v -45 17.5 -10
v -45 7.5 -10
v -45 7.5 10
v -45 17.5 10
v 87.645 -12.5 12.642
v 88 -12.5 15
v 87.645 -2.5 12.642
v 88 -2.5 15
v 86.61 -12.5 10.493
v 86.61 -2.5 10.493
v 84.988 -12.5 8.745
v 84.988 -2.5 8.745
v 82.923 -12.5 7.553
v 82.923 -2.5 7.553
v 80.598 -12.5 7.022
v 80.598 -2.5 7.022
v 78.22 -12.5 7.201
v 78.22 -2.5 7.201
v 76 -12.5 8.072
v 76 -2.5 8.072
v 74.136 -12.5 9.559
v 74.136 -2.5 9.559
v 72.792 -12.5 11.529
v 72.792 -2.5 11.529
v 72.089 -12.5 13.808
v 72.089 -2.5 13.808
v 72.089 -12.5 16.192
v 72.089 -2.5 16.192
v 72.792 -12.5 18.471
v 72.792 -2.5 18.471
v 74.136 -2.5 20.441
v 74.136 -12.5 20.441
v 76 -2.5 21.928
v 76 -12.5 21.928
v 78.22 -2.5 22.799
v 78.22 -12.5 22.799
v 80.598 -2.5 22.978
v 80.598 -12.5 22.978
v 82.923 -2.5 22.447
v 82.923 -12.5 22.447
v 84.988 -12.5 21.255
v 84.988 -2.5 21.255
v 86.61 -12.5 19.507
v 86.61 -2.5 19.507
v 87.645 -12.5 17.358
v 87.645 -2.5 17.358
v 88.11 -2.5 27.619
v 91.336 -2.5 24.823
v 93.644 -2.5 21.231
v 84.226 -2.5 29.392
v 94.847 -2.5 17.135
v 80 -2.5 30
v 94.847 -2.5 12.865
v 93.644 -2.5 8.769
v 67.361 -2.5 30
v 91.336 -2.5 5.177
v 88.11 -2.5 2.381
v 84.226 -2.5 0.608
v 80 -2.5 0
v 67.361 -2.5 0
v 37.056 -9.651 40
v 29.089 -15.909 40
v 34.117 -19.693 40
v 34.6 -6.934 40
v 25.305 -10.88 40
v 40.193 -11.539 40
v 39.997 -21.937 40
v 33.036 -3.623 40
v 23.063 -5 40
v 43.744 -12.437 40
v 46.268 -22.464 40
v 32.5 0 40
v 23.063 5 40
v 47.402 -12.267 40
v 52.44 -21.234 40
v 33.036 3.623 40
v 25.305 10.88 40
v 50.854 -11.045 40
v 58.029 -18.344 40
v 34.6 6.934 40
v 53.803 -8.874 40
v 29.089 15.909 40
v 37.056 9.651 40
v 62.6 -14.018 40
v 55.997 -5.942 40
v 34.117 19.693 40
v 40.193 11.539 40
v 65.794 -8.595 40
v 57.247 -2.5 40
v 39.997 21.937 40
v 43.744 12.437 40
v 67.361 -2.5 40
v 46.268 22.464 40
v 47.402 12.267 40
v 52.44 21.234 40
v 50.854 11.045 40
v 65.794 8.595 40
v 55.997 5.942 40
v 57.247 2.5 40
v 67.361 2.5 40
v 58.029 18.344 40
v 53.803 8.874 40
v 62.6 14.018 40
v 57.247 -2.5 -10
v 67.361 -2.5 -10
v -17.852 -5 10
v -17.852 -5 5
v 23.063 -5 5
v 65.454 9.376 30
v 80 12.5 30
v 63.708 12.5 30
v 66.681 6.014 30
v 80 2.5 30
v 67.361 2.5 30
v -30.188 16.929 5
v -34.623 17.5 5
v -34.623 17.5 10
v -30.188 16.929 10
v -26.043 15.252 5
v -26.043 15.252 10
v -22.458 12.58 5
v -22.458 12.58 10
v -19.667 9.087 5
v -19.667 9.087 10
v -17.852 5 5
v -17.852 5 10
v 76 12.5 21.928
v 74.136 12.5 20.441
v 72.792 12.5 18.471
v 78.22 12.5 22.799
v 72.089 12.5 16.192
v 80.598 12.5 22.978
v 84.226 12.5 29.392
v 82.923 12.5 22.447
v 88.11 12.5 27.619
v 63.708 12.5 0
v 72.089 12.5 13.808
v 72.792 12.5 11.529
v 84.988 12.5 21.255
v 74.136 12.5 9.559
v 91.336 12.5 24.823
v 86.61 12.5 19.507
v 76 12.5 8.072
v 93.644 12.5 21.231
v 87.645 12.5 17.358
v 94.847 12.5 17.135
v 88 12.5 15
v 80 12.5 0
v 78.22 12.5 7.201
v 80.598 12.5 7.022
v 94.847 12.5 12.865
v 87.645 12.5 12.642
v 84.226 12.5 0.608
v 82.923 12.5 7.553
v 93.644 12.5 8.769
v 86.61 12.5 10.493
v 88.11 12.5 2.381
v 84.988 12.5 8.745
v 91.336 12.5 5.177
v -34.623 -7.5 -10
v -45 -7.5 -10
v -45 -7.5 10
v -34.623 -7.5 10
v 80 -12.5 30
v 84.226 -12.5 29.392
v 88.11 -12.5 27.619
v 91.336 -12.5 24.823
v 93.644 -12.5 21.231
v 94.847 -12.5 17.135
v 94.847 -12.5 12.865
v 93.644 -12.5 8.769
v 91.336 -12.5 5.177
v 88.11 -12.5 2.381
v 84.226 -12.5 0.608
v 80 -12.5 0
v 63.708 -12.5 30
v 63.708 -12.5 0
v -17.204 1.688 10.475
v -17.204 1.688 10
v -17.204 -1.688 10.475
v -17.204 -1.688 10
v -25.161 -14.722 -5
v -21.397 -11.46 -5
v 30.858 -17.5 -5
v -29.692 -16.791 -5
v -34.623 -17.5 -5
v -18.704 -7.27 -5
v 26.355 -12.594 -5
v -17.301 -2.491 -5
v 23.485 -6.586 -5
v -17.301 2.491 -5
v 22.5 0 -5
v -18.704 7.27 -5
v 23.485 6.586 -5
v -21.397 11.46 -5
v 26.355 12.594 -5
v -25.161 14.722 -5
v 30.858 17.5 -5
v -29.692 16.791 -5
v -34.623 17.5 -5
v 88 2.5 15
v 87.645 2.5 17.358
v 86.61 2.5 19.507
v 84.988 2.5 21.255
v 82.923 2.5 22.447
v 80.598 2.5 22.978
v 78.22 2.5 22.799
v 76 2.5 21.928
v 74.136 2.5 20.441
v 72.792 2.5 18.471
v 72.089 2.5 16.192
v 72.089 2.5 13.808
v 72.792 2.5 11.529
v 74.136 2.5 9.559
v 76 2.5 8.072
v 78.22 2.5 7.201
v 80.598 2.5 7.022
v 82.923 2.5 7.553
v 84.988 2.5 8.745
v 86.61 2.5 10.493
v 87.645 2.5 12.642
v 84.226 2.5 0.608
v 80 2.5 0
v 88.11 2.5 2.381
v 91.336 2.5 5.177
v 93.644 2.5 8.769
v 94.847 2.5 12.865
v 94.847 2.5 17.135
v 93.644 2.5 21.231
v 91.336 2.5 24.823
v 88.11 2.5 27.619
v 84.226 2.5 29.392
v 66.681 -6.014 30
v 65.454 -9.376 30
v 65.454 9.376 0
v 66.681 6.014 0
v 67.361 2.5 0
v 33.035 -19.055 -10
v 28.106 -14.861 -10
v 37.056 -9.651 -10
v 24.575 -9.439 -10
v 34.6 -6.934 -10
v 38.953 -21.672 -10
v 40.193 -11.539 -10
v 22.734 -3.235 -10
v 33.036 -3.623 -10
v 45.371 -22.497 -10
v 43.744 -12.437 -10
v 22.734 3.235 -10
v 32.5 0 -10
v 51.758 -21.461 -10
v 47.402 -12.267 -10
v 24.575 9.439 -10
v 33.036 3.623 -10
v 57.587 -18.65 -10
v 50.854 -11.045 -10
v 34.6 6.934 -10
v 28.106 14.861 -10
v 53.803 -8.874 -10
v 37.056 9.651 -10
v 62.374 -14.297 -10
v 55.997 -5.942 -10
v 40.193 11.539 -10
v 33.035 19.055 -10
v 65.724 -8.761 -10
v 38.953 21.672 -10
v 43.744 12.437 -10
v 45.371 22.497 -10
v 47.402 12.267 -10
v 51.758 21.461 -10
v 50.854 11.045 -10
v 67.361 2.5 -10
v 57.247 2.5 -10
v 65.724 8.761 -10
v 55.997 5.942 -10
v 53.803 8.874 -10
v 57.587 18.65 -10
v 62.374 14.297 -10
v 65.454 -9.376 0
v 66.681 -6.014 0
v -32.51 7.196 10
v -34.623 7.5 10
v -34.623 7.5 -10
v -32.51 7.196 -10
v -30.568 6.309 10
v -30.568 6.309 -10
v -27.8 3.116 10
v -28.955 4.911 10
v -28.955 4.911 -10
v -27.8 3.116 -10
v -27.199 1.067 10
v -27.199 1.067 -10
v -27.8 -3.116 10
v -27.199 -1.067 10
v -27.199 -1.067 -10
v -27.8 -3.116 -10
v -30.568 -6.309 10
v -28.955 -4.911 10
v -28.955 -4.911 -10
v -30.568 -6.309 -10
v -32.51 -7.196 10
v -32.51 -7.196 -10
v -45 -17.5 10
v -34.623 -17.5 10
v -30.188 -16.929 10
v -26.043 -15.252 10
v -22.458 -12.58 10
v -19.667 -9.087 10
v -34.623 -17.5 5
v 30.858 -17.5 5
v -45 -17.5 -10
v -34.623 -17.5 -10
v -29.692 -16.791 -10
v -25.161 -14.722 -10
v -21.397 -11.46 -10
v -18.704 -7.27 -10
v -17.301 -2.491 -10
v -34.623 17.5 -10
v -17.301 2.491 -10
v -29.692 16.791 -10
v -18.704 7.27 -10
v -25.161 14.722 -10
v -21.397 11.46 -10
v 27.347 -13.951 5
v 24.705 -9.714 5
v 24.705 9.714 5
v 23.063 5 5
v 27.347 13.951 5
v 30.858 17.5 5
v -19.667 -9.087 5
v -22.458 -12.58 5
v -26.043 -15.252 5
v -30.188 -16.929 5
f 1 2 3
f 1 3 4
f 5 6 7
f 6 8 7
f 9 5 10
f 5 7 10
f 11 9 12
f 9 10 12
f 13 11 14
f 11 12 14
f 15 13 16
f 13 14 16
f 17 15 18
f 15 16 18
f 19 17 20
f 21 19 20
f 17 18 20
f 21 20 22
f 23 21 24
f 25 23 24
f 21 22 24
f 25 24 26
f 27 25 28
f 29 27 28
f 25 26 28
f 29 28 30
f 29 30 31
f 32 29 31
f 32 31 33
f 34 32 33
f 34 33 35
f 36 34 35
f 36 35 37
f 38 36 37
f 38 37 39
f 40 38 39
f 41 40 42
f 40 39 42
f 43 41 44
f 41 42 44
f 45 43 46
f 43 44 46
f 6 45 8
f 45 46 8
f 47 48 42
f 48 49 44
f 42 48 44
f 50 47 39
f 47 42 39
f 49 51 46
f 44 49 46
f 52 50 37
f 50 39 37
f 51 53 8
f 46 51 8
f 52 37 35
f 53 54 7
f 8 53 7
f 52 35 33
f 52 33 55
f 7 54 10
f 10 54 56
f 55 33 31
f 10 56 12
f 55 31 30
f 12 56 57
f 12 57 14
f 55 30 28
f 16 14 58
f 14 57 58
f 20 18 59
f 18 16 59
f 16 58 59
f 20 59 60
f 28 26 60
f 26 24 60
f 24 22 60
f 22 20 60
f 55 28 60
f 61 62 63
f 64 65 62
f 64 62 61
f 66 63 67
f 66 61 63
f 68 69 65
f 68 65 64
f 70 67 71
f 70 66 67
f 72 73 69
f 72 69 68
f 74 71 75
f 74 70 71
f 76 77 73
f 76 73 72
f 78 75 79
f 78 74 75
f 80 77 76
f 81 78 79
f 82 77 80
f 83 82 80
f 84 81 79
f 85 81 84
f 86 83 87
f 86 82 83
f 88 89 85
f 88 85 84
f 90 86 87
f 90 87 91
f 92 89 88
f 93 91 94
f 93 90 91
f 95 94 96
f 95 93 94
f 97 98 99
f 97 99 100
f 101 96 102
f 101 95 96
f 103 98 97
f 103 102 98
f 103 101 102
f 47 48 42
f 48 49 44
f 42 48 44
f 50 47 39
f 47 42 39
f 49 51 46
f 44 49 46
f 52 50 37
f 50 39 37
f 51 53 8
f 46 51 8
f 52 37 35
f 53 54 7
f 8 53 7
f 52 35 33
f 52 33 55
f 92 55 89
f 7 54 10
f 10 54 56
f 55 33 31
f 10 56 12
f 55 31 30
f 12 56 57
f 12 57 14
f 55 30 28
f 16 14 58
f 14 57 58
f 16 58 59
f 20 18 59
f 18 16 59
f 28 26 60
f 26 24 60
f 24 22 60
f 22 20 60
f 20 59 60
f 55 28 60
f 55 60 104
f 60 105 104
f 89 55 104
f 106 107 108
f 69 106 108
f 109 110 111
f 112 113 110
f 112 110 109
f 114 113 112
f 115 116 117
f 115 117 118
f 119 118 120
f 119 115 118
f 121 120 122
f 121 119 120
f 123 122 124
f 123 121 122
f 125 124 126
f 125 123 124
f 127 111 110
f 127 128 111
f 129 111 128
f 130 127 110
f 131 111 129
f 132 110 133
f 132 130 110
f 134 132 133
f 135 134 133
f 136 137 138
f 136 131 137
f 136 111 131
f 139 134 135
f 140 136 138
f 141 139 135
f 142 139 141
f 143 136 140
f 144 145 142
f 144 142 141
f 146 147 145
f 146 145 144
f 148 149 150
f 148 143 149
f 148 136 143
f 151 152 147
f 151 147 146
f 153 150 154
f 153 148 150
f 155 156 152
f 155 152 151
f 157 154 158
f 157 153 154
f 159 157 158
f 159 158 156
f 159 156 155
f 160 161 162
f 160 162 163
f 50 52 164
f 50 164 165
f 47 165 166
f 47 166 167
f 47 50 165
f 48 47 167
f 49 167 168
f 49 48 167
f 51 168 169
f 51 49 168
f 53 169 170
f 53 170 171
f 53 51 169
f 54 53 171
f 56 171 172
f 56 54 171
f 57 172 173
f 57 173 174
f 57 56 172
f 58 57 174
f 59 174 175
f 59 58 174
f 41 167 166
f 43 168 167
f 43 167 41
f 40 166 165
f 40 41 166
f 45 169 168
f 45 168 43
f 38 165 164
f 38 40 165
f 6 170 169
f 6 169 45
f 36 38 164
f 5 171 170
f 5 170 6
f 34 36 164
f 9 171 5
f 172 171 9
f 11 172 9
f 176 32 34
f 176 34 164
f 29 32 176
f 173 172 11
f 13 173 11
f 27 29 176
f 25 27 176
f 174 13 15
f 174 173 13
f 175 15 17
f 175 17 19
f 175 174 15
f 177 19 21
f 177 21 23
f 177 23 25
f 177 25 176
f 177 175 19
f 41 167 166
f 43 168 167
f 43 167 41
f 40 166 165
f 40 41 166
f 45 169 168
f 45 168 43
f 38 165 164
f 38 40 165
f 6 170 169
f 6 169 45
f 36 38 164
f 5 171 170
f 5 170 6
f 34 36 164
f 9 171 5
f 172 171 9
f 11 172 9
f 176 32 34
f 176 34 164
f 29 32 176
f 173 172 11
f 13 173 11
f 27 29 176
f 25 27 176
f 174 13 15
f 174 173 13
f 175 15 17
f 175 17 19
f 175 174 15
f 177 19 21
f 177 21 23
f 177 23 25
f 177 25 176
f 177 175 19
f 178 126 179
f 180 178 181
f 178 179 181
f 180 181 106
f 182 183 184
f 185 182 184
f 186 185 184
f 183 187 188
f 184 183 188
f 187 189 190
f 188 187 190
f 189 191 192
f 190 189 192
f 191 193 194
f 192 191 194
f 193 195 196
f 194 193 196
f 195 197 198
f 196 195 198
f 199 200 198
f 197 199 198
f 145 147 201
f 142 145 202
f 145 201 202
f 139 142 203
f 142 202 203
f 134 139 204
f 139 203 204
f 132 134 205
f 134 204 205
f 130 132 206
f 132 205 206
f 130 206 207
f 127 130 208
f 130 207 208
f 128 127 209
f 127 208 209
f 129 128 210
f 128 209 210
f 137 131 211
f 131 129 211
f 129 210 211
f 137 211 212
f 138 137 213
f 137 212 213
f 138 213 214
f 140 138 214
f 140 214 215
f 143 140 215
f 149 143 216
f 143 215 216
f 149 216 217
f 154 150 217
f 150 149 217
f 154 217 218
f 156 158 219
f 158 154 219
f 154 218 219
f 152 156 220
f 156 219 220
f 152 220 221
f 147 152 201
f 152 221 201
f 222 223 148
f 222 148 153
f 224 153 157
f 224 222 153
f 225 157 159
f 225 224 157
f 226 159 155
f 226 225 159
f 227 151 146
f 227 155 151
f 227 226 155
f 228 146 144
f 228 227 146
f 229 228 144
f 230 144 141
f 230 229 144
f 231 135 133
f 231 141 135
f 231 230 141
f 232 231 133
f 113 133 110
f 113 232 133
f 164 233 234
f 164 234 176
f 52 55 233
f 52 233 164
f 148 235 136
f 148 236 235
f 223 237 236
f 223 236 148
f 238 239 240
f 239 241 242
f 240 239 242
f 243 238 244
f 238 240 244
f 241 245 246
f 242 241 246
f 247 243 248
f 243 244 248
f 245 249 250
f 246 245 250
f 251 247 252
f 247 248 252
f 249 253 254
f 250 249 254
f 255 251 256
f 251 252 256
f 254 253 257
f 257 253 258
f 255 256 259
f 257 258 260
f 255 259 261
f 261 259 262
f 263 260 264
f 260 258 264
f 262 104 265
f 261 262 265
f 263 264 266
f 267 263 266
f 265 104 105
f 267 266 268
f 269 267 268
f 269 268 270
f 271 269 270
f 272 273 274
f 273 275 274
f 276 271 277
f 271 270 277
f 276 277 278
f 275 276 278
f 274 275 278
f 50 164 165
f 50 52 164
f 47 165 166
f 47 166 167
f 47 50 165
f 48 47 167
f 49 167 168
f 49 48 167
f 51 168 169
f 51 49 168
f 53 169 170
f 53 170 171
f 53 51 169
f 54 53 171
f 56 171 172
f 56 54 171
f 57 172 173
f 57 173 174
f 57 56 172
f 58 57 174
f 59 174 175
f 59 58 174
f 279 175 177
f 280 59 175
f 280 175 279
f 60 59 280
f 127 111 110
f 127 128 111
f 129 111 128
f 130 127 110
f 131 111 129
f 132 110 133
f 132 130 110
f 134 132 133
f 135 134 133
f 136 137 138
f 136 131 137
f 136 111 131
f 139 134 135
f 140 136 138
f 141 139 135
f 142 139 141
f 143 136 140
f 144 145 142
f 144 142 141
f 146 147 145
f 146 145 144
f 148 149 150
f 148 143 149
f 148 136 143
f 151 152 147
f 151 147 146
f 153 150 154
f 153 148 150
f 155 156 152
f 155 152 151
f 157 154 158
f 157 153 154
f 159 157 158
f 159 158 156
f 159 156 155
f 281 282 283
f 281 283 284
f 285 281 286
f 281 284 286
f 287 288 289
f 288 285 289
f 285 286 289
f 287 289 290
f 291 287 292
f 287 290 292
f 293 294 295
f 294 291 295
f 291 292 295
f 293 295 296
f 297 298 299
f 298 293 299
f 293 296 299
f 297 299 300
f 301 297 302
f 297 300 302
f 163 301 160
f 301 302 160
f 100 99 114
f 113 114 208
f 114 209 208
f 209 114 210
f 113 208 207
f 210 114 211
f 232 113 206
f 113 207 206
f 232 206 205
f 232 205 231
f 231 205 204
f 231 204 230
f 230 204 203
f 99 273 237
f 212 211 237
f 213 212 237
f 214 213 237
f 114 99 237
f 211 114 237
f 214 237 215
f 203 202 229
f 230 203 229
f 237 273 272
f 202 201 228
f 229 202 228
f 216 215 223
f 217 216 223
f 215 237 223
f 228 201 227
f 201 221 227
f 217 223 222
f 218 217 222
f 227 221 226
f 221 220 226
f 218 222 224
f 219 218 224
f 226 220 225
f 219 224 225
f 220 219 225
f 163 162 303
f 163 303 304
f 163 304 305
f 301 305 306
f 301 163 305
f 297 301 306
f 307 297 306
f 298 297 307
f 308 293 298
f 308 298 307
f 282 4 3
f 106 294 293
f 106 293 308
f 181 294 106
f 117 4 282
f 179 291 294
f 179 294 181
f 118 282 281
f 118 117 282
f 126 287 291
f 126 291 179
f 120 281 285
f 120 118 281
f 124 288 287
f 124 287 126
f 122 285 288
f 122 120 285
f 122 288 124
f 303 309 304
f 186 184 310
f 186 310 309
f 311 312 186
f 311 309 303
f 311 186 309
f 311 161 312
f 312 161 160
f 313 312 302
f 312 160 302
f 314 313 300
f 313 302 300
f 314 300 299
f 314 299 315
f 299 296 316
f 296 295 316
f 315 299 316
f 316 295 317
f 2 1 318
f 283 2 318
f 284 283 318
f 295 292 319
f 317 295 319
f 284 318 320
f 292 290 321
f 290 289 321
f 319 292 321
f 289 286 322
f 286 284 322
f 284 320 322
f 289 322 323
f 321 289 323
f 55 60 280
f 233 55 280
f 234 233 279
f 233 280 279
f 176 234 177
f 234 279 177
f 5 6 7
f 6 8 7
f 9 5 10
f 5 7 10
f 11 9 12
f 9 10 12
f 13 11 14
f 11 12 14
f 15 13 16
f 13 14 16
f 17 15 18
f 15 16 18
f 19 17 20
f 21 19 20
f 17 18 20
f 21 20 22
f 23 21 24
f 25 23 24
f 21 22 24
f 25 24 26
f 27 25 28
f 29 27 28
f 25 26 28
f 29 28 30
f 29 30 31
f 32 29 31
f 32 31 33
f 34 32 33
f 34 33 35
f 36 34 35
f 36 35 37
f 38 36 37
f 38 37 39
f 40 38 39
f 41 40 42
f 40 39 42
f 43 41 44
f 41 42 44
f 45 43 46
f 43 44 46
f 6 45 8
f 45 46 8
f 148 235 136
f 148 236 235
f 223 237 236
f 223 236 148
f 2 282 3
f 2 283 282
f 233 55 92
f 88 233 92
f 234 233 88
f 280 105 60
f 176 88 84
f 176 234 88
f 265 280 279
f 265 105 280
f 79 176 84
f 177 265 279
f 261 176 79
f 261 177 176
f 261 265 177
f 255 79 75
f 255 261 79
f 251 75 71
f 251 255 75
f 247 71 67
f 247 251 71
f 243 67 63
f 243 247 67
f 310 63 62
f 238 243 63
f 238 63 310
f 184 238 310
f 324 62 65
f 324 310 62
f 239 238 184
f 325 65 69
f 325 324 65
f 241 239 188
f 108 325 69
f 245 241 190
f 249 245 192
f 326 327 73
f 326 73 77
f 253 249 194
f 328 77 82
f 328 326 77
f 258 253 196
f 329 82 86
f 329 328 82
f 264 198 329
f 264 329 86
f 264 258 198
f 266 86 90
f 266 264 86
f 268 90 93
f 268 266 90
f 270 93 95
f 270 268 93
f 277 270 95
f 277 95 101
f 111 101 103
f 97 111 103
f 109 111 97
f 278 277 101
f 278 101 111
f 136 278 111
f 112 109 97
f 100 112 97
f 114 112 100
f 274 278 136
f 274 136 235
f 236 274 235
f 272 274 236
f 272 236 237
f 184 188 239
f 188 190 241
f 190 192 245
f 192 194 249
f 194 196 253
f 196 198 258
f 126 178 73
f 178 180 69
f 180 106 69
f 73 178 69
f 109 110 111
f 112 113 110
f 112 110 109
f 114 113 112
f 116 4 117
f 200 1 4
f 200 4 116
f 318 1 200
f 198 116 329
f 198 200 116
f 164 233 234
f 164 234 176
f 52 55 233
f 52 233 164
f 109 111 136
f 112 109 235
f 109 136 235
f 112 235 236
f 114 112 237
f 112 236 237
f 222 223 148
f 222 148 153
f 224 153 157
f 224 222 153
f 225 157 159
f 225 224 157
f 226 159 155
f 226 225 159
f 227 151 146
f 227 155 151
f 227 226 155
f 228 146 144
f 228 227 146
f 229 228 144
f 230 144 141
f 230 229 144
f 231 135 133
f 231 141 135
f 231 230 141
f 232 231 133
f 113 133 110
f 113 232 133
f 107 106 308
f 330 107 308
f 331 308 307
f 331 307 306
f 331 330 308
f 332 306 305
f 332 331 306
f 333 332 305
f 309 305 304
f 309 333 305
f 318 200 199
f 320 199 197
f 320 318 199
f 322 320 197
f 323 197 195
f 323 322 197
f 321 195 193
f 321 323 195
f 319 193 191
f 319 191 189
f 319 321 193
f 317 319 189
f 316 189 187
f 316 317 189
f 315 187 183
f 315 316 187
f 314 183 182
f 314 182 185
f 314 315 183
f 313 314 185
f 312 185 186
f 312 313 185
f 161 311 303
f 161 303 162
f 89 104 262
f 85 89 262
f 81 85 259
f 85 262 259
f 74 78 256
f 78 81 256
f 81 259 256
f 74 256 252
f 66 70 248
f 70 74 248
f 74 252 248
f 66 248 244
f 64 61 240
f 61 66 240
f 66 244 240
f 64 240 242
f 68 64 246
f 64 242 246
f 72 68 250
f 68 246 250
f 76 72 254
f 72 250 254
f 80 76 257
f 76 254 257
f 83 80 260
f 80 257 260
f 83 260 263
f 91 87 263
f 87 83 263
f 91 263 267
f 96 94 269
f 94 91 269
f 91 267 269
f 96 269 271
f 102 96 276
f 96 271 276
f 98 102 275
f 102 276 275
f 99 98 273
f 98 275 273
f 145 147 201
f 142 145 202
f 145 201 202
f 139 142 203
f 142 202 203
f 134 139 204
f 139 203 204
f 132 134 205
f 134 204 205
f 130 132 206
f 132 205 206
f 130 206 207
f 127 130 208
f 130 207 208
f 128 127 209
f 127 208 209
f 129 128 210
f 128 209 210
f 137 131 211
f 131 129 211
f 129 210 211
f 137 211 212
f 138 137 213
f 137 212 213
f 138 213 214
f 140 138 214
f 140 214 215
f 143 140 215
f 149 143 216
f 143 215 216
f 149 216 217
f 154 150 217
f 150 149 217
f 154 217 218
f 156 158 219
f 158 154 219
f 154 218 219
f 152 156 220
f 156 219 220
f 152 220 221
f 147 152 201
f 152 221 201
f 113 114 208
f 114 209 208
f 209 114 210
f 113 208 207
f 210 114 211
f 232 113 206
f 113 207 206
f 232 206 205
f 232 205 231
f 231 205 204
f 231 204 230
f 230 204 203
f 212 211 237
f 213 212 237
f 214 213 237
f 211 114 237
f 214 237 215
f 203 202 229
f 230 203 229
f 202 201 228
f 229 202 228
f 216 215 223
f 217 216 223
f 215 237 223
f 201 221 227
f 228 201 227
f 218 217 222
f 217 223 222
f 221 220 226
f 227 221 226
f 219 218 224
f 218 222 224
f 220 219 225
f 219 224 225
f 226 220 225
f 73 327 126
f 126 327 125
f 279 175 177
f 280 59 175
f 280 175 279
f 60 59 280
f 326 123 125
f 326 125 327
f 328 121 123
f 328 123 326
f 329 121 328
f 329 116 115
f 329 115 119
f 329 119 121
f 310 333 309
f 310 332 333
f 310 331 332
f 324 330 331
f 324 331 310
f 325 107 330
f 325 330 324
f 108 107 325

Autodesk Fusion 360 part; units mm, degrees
sketch "Sketch1" plane through (0, 0, 0) normal (0, 0, 1) x (1, 0, 0)
  line L0 (30.8579, -17.5) -> (-45, -17.5)
  line L1 (-45, 17.5) -> (30.8579, 17.5)
  line L2 (-34.6227, 7.5) -> (-45, 7.5)
  line L3 (-45, -7.5) -> (-34.6227, -7.5)
  line L4 (67.3607, -2.5) -> (57.2474, -2.5)
  line L5 (57.2474, 2.5) -> (67.3607, 2.5)
  line L6 (23.0626, 5) -> (-17.8522, 5)
  line L7 (-17.8522, -5) -> (23.0626, -5)
  arc A0 (-34.6227, -17.5) -> (-34.6227, 17.5) centre (-34.6227, 0) ccw
  line L8 (-45, -17.5) -> (-45, -7.5)
  line L9 (-45, 7.5) -> (-45, 17.5)
  arc A1 (-34.6227, -7.5) -> (-34.6227, 7.5) centre (-34.6227, 0) ccw
  arc A2 (67.3607, 2.5) -> (67.3607, -2.5) centre (45, 0) ccw
  arc A3 (57.2474, 2.5) -> (57.2474, -2.5) centre (45, 0) ccw
  dimension "d2" = 35
  dimension "d3" = 15
  dimension "d4" = 35
  dimension "d5" = 25
  dimension "d6" = 45
  dimension "d8" = 15
extrude "Extrude1" add sketch "Sketch1" along normal mid plane 10 contours L0 L7 A0 A2 | L6 L7 A0 A2 | L1 L6 A0 A2 makes body 1
extrude "Extrude2" add sketch "Sketch1" along normal mid plane 20 contours L0 L1 L2 L3 A0 L8 L9 A1 bodies 1
extrude "Extrude3" add sketch "Sketch1" along normal blind 40 and the other way blind 10 contours L4 L5 A2 A3 bodies 1
extrude "Extrude4" add sketch "Sketch1" along normal blind 40 contours L6 L7 A0 A2 bodies 1
sketch "Sketch2" plane through (0, -5, 0) normal (0, -1, 0) x (1, 0, 0)
  line L0 (-17.8522, 5) -> (23.0626, 5)
  line L1 (23.0626, 5) -> (23.0626, 40)
  line L2 (23.0626, 40) -> (-17.8522, 40)
  line L3 (-17.8522, 40) -> (-17.8522, 10)
  line L4 (-17.8522, 10) -> (-17.8522, 5)
  line L5 (-17.8522, 10) -> (23.0626, 40)
  line L6 (23.0626, 40) -> (-17.8522, 40)
  line L7 (-17.8522, 40) -> (-17.8522, 10)
extrude "Extrude5" cut sketch "Sketch2" against normal blind 40 contours L2 L3 L5 L6 L7 bodies 1
sketch "Sketch3" plane through (0, 0, 0) normal (0, 1, 0) x (1, 0, 0)
  circle A0 centre (80, -15) radius 8
  line L0 (80, -30) -> (50, -30)
  line L1 (50, -30) -> (50, 0)
  line L2 (50, 0) -> (80, 0)
  line L3 (80, 0) -> (80, -30)
  arc A1 (80, -30) -> (80, 0) centre (80, -15) ccw
  point P0 (-45, 10)
  point P1 (67.3607, 10)
  dimension "d25" = 16
  dimension "d26" = 30
  dimension "d27" = 30
  dimension "d28" = 125
  dimension "d29" = 25
extrude "Extrude6" add sketch "Sketch3" along normal blind 10 from surface at 2.5 separate body contours A0 L3 A1 | A0 L0 L1 L2 L3 makes body 2
combine "Combine1" operation cut target body 2 tool bodies 1 keep tools makes body 3 at (57.1207, 3.0559, 10)
delete_body "RemoveBody1" bodies 3
mirror "Mirror1" about plane through (0, 0, 0) normal (0, 1, 0) of "Extrude6" makes body 4
combine "Combine2" operation cut target body 4 tool bodies 1 keep tools makes body 5 at (57.1207, -3.0559, 20)
delete_body "RemoveBody2" bodies 5
combine "Combine3" operation add target body 1 tool bodies 2 4 keep tools
